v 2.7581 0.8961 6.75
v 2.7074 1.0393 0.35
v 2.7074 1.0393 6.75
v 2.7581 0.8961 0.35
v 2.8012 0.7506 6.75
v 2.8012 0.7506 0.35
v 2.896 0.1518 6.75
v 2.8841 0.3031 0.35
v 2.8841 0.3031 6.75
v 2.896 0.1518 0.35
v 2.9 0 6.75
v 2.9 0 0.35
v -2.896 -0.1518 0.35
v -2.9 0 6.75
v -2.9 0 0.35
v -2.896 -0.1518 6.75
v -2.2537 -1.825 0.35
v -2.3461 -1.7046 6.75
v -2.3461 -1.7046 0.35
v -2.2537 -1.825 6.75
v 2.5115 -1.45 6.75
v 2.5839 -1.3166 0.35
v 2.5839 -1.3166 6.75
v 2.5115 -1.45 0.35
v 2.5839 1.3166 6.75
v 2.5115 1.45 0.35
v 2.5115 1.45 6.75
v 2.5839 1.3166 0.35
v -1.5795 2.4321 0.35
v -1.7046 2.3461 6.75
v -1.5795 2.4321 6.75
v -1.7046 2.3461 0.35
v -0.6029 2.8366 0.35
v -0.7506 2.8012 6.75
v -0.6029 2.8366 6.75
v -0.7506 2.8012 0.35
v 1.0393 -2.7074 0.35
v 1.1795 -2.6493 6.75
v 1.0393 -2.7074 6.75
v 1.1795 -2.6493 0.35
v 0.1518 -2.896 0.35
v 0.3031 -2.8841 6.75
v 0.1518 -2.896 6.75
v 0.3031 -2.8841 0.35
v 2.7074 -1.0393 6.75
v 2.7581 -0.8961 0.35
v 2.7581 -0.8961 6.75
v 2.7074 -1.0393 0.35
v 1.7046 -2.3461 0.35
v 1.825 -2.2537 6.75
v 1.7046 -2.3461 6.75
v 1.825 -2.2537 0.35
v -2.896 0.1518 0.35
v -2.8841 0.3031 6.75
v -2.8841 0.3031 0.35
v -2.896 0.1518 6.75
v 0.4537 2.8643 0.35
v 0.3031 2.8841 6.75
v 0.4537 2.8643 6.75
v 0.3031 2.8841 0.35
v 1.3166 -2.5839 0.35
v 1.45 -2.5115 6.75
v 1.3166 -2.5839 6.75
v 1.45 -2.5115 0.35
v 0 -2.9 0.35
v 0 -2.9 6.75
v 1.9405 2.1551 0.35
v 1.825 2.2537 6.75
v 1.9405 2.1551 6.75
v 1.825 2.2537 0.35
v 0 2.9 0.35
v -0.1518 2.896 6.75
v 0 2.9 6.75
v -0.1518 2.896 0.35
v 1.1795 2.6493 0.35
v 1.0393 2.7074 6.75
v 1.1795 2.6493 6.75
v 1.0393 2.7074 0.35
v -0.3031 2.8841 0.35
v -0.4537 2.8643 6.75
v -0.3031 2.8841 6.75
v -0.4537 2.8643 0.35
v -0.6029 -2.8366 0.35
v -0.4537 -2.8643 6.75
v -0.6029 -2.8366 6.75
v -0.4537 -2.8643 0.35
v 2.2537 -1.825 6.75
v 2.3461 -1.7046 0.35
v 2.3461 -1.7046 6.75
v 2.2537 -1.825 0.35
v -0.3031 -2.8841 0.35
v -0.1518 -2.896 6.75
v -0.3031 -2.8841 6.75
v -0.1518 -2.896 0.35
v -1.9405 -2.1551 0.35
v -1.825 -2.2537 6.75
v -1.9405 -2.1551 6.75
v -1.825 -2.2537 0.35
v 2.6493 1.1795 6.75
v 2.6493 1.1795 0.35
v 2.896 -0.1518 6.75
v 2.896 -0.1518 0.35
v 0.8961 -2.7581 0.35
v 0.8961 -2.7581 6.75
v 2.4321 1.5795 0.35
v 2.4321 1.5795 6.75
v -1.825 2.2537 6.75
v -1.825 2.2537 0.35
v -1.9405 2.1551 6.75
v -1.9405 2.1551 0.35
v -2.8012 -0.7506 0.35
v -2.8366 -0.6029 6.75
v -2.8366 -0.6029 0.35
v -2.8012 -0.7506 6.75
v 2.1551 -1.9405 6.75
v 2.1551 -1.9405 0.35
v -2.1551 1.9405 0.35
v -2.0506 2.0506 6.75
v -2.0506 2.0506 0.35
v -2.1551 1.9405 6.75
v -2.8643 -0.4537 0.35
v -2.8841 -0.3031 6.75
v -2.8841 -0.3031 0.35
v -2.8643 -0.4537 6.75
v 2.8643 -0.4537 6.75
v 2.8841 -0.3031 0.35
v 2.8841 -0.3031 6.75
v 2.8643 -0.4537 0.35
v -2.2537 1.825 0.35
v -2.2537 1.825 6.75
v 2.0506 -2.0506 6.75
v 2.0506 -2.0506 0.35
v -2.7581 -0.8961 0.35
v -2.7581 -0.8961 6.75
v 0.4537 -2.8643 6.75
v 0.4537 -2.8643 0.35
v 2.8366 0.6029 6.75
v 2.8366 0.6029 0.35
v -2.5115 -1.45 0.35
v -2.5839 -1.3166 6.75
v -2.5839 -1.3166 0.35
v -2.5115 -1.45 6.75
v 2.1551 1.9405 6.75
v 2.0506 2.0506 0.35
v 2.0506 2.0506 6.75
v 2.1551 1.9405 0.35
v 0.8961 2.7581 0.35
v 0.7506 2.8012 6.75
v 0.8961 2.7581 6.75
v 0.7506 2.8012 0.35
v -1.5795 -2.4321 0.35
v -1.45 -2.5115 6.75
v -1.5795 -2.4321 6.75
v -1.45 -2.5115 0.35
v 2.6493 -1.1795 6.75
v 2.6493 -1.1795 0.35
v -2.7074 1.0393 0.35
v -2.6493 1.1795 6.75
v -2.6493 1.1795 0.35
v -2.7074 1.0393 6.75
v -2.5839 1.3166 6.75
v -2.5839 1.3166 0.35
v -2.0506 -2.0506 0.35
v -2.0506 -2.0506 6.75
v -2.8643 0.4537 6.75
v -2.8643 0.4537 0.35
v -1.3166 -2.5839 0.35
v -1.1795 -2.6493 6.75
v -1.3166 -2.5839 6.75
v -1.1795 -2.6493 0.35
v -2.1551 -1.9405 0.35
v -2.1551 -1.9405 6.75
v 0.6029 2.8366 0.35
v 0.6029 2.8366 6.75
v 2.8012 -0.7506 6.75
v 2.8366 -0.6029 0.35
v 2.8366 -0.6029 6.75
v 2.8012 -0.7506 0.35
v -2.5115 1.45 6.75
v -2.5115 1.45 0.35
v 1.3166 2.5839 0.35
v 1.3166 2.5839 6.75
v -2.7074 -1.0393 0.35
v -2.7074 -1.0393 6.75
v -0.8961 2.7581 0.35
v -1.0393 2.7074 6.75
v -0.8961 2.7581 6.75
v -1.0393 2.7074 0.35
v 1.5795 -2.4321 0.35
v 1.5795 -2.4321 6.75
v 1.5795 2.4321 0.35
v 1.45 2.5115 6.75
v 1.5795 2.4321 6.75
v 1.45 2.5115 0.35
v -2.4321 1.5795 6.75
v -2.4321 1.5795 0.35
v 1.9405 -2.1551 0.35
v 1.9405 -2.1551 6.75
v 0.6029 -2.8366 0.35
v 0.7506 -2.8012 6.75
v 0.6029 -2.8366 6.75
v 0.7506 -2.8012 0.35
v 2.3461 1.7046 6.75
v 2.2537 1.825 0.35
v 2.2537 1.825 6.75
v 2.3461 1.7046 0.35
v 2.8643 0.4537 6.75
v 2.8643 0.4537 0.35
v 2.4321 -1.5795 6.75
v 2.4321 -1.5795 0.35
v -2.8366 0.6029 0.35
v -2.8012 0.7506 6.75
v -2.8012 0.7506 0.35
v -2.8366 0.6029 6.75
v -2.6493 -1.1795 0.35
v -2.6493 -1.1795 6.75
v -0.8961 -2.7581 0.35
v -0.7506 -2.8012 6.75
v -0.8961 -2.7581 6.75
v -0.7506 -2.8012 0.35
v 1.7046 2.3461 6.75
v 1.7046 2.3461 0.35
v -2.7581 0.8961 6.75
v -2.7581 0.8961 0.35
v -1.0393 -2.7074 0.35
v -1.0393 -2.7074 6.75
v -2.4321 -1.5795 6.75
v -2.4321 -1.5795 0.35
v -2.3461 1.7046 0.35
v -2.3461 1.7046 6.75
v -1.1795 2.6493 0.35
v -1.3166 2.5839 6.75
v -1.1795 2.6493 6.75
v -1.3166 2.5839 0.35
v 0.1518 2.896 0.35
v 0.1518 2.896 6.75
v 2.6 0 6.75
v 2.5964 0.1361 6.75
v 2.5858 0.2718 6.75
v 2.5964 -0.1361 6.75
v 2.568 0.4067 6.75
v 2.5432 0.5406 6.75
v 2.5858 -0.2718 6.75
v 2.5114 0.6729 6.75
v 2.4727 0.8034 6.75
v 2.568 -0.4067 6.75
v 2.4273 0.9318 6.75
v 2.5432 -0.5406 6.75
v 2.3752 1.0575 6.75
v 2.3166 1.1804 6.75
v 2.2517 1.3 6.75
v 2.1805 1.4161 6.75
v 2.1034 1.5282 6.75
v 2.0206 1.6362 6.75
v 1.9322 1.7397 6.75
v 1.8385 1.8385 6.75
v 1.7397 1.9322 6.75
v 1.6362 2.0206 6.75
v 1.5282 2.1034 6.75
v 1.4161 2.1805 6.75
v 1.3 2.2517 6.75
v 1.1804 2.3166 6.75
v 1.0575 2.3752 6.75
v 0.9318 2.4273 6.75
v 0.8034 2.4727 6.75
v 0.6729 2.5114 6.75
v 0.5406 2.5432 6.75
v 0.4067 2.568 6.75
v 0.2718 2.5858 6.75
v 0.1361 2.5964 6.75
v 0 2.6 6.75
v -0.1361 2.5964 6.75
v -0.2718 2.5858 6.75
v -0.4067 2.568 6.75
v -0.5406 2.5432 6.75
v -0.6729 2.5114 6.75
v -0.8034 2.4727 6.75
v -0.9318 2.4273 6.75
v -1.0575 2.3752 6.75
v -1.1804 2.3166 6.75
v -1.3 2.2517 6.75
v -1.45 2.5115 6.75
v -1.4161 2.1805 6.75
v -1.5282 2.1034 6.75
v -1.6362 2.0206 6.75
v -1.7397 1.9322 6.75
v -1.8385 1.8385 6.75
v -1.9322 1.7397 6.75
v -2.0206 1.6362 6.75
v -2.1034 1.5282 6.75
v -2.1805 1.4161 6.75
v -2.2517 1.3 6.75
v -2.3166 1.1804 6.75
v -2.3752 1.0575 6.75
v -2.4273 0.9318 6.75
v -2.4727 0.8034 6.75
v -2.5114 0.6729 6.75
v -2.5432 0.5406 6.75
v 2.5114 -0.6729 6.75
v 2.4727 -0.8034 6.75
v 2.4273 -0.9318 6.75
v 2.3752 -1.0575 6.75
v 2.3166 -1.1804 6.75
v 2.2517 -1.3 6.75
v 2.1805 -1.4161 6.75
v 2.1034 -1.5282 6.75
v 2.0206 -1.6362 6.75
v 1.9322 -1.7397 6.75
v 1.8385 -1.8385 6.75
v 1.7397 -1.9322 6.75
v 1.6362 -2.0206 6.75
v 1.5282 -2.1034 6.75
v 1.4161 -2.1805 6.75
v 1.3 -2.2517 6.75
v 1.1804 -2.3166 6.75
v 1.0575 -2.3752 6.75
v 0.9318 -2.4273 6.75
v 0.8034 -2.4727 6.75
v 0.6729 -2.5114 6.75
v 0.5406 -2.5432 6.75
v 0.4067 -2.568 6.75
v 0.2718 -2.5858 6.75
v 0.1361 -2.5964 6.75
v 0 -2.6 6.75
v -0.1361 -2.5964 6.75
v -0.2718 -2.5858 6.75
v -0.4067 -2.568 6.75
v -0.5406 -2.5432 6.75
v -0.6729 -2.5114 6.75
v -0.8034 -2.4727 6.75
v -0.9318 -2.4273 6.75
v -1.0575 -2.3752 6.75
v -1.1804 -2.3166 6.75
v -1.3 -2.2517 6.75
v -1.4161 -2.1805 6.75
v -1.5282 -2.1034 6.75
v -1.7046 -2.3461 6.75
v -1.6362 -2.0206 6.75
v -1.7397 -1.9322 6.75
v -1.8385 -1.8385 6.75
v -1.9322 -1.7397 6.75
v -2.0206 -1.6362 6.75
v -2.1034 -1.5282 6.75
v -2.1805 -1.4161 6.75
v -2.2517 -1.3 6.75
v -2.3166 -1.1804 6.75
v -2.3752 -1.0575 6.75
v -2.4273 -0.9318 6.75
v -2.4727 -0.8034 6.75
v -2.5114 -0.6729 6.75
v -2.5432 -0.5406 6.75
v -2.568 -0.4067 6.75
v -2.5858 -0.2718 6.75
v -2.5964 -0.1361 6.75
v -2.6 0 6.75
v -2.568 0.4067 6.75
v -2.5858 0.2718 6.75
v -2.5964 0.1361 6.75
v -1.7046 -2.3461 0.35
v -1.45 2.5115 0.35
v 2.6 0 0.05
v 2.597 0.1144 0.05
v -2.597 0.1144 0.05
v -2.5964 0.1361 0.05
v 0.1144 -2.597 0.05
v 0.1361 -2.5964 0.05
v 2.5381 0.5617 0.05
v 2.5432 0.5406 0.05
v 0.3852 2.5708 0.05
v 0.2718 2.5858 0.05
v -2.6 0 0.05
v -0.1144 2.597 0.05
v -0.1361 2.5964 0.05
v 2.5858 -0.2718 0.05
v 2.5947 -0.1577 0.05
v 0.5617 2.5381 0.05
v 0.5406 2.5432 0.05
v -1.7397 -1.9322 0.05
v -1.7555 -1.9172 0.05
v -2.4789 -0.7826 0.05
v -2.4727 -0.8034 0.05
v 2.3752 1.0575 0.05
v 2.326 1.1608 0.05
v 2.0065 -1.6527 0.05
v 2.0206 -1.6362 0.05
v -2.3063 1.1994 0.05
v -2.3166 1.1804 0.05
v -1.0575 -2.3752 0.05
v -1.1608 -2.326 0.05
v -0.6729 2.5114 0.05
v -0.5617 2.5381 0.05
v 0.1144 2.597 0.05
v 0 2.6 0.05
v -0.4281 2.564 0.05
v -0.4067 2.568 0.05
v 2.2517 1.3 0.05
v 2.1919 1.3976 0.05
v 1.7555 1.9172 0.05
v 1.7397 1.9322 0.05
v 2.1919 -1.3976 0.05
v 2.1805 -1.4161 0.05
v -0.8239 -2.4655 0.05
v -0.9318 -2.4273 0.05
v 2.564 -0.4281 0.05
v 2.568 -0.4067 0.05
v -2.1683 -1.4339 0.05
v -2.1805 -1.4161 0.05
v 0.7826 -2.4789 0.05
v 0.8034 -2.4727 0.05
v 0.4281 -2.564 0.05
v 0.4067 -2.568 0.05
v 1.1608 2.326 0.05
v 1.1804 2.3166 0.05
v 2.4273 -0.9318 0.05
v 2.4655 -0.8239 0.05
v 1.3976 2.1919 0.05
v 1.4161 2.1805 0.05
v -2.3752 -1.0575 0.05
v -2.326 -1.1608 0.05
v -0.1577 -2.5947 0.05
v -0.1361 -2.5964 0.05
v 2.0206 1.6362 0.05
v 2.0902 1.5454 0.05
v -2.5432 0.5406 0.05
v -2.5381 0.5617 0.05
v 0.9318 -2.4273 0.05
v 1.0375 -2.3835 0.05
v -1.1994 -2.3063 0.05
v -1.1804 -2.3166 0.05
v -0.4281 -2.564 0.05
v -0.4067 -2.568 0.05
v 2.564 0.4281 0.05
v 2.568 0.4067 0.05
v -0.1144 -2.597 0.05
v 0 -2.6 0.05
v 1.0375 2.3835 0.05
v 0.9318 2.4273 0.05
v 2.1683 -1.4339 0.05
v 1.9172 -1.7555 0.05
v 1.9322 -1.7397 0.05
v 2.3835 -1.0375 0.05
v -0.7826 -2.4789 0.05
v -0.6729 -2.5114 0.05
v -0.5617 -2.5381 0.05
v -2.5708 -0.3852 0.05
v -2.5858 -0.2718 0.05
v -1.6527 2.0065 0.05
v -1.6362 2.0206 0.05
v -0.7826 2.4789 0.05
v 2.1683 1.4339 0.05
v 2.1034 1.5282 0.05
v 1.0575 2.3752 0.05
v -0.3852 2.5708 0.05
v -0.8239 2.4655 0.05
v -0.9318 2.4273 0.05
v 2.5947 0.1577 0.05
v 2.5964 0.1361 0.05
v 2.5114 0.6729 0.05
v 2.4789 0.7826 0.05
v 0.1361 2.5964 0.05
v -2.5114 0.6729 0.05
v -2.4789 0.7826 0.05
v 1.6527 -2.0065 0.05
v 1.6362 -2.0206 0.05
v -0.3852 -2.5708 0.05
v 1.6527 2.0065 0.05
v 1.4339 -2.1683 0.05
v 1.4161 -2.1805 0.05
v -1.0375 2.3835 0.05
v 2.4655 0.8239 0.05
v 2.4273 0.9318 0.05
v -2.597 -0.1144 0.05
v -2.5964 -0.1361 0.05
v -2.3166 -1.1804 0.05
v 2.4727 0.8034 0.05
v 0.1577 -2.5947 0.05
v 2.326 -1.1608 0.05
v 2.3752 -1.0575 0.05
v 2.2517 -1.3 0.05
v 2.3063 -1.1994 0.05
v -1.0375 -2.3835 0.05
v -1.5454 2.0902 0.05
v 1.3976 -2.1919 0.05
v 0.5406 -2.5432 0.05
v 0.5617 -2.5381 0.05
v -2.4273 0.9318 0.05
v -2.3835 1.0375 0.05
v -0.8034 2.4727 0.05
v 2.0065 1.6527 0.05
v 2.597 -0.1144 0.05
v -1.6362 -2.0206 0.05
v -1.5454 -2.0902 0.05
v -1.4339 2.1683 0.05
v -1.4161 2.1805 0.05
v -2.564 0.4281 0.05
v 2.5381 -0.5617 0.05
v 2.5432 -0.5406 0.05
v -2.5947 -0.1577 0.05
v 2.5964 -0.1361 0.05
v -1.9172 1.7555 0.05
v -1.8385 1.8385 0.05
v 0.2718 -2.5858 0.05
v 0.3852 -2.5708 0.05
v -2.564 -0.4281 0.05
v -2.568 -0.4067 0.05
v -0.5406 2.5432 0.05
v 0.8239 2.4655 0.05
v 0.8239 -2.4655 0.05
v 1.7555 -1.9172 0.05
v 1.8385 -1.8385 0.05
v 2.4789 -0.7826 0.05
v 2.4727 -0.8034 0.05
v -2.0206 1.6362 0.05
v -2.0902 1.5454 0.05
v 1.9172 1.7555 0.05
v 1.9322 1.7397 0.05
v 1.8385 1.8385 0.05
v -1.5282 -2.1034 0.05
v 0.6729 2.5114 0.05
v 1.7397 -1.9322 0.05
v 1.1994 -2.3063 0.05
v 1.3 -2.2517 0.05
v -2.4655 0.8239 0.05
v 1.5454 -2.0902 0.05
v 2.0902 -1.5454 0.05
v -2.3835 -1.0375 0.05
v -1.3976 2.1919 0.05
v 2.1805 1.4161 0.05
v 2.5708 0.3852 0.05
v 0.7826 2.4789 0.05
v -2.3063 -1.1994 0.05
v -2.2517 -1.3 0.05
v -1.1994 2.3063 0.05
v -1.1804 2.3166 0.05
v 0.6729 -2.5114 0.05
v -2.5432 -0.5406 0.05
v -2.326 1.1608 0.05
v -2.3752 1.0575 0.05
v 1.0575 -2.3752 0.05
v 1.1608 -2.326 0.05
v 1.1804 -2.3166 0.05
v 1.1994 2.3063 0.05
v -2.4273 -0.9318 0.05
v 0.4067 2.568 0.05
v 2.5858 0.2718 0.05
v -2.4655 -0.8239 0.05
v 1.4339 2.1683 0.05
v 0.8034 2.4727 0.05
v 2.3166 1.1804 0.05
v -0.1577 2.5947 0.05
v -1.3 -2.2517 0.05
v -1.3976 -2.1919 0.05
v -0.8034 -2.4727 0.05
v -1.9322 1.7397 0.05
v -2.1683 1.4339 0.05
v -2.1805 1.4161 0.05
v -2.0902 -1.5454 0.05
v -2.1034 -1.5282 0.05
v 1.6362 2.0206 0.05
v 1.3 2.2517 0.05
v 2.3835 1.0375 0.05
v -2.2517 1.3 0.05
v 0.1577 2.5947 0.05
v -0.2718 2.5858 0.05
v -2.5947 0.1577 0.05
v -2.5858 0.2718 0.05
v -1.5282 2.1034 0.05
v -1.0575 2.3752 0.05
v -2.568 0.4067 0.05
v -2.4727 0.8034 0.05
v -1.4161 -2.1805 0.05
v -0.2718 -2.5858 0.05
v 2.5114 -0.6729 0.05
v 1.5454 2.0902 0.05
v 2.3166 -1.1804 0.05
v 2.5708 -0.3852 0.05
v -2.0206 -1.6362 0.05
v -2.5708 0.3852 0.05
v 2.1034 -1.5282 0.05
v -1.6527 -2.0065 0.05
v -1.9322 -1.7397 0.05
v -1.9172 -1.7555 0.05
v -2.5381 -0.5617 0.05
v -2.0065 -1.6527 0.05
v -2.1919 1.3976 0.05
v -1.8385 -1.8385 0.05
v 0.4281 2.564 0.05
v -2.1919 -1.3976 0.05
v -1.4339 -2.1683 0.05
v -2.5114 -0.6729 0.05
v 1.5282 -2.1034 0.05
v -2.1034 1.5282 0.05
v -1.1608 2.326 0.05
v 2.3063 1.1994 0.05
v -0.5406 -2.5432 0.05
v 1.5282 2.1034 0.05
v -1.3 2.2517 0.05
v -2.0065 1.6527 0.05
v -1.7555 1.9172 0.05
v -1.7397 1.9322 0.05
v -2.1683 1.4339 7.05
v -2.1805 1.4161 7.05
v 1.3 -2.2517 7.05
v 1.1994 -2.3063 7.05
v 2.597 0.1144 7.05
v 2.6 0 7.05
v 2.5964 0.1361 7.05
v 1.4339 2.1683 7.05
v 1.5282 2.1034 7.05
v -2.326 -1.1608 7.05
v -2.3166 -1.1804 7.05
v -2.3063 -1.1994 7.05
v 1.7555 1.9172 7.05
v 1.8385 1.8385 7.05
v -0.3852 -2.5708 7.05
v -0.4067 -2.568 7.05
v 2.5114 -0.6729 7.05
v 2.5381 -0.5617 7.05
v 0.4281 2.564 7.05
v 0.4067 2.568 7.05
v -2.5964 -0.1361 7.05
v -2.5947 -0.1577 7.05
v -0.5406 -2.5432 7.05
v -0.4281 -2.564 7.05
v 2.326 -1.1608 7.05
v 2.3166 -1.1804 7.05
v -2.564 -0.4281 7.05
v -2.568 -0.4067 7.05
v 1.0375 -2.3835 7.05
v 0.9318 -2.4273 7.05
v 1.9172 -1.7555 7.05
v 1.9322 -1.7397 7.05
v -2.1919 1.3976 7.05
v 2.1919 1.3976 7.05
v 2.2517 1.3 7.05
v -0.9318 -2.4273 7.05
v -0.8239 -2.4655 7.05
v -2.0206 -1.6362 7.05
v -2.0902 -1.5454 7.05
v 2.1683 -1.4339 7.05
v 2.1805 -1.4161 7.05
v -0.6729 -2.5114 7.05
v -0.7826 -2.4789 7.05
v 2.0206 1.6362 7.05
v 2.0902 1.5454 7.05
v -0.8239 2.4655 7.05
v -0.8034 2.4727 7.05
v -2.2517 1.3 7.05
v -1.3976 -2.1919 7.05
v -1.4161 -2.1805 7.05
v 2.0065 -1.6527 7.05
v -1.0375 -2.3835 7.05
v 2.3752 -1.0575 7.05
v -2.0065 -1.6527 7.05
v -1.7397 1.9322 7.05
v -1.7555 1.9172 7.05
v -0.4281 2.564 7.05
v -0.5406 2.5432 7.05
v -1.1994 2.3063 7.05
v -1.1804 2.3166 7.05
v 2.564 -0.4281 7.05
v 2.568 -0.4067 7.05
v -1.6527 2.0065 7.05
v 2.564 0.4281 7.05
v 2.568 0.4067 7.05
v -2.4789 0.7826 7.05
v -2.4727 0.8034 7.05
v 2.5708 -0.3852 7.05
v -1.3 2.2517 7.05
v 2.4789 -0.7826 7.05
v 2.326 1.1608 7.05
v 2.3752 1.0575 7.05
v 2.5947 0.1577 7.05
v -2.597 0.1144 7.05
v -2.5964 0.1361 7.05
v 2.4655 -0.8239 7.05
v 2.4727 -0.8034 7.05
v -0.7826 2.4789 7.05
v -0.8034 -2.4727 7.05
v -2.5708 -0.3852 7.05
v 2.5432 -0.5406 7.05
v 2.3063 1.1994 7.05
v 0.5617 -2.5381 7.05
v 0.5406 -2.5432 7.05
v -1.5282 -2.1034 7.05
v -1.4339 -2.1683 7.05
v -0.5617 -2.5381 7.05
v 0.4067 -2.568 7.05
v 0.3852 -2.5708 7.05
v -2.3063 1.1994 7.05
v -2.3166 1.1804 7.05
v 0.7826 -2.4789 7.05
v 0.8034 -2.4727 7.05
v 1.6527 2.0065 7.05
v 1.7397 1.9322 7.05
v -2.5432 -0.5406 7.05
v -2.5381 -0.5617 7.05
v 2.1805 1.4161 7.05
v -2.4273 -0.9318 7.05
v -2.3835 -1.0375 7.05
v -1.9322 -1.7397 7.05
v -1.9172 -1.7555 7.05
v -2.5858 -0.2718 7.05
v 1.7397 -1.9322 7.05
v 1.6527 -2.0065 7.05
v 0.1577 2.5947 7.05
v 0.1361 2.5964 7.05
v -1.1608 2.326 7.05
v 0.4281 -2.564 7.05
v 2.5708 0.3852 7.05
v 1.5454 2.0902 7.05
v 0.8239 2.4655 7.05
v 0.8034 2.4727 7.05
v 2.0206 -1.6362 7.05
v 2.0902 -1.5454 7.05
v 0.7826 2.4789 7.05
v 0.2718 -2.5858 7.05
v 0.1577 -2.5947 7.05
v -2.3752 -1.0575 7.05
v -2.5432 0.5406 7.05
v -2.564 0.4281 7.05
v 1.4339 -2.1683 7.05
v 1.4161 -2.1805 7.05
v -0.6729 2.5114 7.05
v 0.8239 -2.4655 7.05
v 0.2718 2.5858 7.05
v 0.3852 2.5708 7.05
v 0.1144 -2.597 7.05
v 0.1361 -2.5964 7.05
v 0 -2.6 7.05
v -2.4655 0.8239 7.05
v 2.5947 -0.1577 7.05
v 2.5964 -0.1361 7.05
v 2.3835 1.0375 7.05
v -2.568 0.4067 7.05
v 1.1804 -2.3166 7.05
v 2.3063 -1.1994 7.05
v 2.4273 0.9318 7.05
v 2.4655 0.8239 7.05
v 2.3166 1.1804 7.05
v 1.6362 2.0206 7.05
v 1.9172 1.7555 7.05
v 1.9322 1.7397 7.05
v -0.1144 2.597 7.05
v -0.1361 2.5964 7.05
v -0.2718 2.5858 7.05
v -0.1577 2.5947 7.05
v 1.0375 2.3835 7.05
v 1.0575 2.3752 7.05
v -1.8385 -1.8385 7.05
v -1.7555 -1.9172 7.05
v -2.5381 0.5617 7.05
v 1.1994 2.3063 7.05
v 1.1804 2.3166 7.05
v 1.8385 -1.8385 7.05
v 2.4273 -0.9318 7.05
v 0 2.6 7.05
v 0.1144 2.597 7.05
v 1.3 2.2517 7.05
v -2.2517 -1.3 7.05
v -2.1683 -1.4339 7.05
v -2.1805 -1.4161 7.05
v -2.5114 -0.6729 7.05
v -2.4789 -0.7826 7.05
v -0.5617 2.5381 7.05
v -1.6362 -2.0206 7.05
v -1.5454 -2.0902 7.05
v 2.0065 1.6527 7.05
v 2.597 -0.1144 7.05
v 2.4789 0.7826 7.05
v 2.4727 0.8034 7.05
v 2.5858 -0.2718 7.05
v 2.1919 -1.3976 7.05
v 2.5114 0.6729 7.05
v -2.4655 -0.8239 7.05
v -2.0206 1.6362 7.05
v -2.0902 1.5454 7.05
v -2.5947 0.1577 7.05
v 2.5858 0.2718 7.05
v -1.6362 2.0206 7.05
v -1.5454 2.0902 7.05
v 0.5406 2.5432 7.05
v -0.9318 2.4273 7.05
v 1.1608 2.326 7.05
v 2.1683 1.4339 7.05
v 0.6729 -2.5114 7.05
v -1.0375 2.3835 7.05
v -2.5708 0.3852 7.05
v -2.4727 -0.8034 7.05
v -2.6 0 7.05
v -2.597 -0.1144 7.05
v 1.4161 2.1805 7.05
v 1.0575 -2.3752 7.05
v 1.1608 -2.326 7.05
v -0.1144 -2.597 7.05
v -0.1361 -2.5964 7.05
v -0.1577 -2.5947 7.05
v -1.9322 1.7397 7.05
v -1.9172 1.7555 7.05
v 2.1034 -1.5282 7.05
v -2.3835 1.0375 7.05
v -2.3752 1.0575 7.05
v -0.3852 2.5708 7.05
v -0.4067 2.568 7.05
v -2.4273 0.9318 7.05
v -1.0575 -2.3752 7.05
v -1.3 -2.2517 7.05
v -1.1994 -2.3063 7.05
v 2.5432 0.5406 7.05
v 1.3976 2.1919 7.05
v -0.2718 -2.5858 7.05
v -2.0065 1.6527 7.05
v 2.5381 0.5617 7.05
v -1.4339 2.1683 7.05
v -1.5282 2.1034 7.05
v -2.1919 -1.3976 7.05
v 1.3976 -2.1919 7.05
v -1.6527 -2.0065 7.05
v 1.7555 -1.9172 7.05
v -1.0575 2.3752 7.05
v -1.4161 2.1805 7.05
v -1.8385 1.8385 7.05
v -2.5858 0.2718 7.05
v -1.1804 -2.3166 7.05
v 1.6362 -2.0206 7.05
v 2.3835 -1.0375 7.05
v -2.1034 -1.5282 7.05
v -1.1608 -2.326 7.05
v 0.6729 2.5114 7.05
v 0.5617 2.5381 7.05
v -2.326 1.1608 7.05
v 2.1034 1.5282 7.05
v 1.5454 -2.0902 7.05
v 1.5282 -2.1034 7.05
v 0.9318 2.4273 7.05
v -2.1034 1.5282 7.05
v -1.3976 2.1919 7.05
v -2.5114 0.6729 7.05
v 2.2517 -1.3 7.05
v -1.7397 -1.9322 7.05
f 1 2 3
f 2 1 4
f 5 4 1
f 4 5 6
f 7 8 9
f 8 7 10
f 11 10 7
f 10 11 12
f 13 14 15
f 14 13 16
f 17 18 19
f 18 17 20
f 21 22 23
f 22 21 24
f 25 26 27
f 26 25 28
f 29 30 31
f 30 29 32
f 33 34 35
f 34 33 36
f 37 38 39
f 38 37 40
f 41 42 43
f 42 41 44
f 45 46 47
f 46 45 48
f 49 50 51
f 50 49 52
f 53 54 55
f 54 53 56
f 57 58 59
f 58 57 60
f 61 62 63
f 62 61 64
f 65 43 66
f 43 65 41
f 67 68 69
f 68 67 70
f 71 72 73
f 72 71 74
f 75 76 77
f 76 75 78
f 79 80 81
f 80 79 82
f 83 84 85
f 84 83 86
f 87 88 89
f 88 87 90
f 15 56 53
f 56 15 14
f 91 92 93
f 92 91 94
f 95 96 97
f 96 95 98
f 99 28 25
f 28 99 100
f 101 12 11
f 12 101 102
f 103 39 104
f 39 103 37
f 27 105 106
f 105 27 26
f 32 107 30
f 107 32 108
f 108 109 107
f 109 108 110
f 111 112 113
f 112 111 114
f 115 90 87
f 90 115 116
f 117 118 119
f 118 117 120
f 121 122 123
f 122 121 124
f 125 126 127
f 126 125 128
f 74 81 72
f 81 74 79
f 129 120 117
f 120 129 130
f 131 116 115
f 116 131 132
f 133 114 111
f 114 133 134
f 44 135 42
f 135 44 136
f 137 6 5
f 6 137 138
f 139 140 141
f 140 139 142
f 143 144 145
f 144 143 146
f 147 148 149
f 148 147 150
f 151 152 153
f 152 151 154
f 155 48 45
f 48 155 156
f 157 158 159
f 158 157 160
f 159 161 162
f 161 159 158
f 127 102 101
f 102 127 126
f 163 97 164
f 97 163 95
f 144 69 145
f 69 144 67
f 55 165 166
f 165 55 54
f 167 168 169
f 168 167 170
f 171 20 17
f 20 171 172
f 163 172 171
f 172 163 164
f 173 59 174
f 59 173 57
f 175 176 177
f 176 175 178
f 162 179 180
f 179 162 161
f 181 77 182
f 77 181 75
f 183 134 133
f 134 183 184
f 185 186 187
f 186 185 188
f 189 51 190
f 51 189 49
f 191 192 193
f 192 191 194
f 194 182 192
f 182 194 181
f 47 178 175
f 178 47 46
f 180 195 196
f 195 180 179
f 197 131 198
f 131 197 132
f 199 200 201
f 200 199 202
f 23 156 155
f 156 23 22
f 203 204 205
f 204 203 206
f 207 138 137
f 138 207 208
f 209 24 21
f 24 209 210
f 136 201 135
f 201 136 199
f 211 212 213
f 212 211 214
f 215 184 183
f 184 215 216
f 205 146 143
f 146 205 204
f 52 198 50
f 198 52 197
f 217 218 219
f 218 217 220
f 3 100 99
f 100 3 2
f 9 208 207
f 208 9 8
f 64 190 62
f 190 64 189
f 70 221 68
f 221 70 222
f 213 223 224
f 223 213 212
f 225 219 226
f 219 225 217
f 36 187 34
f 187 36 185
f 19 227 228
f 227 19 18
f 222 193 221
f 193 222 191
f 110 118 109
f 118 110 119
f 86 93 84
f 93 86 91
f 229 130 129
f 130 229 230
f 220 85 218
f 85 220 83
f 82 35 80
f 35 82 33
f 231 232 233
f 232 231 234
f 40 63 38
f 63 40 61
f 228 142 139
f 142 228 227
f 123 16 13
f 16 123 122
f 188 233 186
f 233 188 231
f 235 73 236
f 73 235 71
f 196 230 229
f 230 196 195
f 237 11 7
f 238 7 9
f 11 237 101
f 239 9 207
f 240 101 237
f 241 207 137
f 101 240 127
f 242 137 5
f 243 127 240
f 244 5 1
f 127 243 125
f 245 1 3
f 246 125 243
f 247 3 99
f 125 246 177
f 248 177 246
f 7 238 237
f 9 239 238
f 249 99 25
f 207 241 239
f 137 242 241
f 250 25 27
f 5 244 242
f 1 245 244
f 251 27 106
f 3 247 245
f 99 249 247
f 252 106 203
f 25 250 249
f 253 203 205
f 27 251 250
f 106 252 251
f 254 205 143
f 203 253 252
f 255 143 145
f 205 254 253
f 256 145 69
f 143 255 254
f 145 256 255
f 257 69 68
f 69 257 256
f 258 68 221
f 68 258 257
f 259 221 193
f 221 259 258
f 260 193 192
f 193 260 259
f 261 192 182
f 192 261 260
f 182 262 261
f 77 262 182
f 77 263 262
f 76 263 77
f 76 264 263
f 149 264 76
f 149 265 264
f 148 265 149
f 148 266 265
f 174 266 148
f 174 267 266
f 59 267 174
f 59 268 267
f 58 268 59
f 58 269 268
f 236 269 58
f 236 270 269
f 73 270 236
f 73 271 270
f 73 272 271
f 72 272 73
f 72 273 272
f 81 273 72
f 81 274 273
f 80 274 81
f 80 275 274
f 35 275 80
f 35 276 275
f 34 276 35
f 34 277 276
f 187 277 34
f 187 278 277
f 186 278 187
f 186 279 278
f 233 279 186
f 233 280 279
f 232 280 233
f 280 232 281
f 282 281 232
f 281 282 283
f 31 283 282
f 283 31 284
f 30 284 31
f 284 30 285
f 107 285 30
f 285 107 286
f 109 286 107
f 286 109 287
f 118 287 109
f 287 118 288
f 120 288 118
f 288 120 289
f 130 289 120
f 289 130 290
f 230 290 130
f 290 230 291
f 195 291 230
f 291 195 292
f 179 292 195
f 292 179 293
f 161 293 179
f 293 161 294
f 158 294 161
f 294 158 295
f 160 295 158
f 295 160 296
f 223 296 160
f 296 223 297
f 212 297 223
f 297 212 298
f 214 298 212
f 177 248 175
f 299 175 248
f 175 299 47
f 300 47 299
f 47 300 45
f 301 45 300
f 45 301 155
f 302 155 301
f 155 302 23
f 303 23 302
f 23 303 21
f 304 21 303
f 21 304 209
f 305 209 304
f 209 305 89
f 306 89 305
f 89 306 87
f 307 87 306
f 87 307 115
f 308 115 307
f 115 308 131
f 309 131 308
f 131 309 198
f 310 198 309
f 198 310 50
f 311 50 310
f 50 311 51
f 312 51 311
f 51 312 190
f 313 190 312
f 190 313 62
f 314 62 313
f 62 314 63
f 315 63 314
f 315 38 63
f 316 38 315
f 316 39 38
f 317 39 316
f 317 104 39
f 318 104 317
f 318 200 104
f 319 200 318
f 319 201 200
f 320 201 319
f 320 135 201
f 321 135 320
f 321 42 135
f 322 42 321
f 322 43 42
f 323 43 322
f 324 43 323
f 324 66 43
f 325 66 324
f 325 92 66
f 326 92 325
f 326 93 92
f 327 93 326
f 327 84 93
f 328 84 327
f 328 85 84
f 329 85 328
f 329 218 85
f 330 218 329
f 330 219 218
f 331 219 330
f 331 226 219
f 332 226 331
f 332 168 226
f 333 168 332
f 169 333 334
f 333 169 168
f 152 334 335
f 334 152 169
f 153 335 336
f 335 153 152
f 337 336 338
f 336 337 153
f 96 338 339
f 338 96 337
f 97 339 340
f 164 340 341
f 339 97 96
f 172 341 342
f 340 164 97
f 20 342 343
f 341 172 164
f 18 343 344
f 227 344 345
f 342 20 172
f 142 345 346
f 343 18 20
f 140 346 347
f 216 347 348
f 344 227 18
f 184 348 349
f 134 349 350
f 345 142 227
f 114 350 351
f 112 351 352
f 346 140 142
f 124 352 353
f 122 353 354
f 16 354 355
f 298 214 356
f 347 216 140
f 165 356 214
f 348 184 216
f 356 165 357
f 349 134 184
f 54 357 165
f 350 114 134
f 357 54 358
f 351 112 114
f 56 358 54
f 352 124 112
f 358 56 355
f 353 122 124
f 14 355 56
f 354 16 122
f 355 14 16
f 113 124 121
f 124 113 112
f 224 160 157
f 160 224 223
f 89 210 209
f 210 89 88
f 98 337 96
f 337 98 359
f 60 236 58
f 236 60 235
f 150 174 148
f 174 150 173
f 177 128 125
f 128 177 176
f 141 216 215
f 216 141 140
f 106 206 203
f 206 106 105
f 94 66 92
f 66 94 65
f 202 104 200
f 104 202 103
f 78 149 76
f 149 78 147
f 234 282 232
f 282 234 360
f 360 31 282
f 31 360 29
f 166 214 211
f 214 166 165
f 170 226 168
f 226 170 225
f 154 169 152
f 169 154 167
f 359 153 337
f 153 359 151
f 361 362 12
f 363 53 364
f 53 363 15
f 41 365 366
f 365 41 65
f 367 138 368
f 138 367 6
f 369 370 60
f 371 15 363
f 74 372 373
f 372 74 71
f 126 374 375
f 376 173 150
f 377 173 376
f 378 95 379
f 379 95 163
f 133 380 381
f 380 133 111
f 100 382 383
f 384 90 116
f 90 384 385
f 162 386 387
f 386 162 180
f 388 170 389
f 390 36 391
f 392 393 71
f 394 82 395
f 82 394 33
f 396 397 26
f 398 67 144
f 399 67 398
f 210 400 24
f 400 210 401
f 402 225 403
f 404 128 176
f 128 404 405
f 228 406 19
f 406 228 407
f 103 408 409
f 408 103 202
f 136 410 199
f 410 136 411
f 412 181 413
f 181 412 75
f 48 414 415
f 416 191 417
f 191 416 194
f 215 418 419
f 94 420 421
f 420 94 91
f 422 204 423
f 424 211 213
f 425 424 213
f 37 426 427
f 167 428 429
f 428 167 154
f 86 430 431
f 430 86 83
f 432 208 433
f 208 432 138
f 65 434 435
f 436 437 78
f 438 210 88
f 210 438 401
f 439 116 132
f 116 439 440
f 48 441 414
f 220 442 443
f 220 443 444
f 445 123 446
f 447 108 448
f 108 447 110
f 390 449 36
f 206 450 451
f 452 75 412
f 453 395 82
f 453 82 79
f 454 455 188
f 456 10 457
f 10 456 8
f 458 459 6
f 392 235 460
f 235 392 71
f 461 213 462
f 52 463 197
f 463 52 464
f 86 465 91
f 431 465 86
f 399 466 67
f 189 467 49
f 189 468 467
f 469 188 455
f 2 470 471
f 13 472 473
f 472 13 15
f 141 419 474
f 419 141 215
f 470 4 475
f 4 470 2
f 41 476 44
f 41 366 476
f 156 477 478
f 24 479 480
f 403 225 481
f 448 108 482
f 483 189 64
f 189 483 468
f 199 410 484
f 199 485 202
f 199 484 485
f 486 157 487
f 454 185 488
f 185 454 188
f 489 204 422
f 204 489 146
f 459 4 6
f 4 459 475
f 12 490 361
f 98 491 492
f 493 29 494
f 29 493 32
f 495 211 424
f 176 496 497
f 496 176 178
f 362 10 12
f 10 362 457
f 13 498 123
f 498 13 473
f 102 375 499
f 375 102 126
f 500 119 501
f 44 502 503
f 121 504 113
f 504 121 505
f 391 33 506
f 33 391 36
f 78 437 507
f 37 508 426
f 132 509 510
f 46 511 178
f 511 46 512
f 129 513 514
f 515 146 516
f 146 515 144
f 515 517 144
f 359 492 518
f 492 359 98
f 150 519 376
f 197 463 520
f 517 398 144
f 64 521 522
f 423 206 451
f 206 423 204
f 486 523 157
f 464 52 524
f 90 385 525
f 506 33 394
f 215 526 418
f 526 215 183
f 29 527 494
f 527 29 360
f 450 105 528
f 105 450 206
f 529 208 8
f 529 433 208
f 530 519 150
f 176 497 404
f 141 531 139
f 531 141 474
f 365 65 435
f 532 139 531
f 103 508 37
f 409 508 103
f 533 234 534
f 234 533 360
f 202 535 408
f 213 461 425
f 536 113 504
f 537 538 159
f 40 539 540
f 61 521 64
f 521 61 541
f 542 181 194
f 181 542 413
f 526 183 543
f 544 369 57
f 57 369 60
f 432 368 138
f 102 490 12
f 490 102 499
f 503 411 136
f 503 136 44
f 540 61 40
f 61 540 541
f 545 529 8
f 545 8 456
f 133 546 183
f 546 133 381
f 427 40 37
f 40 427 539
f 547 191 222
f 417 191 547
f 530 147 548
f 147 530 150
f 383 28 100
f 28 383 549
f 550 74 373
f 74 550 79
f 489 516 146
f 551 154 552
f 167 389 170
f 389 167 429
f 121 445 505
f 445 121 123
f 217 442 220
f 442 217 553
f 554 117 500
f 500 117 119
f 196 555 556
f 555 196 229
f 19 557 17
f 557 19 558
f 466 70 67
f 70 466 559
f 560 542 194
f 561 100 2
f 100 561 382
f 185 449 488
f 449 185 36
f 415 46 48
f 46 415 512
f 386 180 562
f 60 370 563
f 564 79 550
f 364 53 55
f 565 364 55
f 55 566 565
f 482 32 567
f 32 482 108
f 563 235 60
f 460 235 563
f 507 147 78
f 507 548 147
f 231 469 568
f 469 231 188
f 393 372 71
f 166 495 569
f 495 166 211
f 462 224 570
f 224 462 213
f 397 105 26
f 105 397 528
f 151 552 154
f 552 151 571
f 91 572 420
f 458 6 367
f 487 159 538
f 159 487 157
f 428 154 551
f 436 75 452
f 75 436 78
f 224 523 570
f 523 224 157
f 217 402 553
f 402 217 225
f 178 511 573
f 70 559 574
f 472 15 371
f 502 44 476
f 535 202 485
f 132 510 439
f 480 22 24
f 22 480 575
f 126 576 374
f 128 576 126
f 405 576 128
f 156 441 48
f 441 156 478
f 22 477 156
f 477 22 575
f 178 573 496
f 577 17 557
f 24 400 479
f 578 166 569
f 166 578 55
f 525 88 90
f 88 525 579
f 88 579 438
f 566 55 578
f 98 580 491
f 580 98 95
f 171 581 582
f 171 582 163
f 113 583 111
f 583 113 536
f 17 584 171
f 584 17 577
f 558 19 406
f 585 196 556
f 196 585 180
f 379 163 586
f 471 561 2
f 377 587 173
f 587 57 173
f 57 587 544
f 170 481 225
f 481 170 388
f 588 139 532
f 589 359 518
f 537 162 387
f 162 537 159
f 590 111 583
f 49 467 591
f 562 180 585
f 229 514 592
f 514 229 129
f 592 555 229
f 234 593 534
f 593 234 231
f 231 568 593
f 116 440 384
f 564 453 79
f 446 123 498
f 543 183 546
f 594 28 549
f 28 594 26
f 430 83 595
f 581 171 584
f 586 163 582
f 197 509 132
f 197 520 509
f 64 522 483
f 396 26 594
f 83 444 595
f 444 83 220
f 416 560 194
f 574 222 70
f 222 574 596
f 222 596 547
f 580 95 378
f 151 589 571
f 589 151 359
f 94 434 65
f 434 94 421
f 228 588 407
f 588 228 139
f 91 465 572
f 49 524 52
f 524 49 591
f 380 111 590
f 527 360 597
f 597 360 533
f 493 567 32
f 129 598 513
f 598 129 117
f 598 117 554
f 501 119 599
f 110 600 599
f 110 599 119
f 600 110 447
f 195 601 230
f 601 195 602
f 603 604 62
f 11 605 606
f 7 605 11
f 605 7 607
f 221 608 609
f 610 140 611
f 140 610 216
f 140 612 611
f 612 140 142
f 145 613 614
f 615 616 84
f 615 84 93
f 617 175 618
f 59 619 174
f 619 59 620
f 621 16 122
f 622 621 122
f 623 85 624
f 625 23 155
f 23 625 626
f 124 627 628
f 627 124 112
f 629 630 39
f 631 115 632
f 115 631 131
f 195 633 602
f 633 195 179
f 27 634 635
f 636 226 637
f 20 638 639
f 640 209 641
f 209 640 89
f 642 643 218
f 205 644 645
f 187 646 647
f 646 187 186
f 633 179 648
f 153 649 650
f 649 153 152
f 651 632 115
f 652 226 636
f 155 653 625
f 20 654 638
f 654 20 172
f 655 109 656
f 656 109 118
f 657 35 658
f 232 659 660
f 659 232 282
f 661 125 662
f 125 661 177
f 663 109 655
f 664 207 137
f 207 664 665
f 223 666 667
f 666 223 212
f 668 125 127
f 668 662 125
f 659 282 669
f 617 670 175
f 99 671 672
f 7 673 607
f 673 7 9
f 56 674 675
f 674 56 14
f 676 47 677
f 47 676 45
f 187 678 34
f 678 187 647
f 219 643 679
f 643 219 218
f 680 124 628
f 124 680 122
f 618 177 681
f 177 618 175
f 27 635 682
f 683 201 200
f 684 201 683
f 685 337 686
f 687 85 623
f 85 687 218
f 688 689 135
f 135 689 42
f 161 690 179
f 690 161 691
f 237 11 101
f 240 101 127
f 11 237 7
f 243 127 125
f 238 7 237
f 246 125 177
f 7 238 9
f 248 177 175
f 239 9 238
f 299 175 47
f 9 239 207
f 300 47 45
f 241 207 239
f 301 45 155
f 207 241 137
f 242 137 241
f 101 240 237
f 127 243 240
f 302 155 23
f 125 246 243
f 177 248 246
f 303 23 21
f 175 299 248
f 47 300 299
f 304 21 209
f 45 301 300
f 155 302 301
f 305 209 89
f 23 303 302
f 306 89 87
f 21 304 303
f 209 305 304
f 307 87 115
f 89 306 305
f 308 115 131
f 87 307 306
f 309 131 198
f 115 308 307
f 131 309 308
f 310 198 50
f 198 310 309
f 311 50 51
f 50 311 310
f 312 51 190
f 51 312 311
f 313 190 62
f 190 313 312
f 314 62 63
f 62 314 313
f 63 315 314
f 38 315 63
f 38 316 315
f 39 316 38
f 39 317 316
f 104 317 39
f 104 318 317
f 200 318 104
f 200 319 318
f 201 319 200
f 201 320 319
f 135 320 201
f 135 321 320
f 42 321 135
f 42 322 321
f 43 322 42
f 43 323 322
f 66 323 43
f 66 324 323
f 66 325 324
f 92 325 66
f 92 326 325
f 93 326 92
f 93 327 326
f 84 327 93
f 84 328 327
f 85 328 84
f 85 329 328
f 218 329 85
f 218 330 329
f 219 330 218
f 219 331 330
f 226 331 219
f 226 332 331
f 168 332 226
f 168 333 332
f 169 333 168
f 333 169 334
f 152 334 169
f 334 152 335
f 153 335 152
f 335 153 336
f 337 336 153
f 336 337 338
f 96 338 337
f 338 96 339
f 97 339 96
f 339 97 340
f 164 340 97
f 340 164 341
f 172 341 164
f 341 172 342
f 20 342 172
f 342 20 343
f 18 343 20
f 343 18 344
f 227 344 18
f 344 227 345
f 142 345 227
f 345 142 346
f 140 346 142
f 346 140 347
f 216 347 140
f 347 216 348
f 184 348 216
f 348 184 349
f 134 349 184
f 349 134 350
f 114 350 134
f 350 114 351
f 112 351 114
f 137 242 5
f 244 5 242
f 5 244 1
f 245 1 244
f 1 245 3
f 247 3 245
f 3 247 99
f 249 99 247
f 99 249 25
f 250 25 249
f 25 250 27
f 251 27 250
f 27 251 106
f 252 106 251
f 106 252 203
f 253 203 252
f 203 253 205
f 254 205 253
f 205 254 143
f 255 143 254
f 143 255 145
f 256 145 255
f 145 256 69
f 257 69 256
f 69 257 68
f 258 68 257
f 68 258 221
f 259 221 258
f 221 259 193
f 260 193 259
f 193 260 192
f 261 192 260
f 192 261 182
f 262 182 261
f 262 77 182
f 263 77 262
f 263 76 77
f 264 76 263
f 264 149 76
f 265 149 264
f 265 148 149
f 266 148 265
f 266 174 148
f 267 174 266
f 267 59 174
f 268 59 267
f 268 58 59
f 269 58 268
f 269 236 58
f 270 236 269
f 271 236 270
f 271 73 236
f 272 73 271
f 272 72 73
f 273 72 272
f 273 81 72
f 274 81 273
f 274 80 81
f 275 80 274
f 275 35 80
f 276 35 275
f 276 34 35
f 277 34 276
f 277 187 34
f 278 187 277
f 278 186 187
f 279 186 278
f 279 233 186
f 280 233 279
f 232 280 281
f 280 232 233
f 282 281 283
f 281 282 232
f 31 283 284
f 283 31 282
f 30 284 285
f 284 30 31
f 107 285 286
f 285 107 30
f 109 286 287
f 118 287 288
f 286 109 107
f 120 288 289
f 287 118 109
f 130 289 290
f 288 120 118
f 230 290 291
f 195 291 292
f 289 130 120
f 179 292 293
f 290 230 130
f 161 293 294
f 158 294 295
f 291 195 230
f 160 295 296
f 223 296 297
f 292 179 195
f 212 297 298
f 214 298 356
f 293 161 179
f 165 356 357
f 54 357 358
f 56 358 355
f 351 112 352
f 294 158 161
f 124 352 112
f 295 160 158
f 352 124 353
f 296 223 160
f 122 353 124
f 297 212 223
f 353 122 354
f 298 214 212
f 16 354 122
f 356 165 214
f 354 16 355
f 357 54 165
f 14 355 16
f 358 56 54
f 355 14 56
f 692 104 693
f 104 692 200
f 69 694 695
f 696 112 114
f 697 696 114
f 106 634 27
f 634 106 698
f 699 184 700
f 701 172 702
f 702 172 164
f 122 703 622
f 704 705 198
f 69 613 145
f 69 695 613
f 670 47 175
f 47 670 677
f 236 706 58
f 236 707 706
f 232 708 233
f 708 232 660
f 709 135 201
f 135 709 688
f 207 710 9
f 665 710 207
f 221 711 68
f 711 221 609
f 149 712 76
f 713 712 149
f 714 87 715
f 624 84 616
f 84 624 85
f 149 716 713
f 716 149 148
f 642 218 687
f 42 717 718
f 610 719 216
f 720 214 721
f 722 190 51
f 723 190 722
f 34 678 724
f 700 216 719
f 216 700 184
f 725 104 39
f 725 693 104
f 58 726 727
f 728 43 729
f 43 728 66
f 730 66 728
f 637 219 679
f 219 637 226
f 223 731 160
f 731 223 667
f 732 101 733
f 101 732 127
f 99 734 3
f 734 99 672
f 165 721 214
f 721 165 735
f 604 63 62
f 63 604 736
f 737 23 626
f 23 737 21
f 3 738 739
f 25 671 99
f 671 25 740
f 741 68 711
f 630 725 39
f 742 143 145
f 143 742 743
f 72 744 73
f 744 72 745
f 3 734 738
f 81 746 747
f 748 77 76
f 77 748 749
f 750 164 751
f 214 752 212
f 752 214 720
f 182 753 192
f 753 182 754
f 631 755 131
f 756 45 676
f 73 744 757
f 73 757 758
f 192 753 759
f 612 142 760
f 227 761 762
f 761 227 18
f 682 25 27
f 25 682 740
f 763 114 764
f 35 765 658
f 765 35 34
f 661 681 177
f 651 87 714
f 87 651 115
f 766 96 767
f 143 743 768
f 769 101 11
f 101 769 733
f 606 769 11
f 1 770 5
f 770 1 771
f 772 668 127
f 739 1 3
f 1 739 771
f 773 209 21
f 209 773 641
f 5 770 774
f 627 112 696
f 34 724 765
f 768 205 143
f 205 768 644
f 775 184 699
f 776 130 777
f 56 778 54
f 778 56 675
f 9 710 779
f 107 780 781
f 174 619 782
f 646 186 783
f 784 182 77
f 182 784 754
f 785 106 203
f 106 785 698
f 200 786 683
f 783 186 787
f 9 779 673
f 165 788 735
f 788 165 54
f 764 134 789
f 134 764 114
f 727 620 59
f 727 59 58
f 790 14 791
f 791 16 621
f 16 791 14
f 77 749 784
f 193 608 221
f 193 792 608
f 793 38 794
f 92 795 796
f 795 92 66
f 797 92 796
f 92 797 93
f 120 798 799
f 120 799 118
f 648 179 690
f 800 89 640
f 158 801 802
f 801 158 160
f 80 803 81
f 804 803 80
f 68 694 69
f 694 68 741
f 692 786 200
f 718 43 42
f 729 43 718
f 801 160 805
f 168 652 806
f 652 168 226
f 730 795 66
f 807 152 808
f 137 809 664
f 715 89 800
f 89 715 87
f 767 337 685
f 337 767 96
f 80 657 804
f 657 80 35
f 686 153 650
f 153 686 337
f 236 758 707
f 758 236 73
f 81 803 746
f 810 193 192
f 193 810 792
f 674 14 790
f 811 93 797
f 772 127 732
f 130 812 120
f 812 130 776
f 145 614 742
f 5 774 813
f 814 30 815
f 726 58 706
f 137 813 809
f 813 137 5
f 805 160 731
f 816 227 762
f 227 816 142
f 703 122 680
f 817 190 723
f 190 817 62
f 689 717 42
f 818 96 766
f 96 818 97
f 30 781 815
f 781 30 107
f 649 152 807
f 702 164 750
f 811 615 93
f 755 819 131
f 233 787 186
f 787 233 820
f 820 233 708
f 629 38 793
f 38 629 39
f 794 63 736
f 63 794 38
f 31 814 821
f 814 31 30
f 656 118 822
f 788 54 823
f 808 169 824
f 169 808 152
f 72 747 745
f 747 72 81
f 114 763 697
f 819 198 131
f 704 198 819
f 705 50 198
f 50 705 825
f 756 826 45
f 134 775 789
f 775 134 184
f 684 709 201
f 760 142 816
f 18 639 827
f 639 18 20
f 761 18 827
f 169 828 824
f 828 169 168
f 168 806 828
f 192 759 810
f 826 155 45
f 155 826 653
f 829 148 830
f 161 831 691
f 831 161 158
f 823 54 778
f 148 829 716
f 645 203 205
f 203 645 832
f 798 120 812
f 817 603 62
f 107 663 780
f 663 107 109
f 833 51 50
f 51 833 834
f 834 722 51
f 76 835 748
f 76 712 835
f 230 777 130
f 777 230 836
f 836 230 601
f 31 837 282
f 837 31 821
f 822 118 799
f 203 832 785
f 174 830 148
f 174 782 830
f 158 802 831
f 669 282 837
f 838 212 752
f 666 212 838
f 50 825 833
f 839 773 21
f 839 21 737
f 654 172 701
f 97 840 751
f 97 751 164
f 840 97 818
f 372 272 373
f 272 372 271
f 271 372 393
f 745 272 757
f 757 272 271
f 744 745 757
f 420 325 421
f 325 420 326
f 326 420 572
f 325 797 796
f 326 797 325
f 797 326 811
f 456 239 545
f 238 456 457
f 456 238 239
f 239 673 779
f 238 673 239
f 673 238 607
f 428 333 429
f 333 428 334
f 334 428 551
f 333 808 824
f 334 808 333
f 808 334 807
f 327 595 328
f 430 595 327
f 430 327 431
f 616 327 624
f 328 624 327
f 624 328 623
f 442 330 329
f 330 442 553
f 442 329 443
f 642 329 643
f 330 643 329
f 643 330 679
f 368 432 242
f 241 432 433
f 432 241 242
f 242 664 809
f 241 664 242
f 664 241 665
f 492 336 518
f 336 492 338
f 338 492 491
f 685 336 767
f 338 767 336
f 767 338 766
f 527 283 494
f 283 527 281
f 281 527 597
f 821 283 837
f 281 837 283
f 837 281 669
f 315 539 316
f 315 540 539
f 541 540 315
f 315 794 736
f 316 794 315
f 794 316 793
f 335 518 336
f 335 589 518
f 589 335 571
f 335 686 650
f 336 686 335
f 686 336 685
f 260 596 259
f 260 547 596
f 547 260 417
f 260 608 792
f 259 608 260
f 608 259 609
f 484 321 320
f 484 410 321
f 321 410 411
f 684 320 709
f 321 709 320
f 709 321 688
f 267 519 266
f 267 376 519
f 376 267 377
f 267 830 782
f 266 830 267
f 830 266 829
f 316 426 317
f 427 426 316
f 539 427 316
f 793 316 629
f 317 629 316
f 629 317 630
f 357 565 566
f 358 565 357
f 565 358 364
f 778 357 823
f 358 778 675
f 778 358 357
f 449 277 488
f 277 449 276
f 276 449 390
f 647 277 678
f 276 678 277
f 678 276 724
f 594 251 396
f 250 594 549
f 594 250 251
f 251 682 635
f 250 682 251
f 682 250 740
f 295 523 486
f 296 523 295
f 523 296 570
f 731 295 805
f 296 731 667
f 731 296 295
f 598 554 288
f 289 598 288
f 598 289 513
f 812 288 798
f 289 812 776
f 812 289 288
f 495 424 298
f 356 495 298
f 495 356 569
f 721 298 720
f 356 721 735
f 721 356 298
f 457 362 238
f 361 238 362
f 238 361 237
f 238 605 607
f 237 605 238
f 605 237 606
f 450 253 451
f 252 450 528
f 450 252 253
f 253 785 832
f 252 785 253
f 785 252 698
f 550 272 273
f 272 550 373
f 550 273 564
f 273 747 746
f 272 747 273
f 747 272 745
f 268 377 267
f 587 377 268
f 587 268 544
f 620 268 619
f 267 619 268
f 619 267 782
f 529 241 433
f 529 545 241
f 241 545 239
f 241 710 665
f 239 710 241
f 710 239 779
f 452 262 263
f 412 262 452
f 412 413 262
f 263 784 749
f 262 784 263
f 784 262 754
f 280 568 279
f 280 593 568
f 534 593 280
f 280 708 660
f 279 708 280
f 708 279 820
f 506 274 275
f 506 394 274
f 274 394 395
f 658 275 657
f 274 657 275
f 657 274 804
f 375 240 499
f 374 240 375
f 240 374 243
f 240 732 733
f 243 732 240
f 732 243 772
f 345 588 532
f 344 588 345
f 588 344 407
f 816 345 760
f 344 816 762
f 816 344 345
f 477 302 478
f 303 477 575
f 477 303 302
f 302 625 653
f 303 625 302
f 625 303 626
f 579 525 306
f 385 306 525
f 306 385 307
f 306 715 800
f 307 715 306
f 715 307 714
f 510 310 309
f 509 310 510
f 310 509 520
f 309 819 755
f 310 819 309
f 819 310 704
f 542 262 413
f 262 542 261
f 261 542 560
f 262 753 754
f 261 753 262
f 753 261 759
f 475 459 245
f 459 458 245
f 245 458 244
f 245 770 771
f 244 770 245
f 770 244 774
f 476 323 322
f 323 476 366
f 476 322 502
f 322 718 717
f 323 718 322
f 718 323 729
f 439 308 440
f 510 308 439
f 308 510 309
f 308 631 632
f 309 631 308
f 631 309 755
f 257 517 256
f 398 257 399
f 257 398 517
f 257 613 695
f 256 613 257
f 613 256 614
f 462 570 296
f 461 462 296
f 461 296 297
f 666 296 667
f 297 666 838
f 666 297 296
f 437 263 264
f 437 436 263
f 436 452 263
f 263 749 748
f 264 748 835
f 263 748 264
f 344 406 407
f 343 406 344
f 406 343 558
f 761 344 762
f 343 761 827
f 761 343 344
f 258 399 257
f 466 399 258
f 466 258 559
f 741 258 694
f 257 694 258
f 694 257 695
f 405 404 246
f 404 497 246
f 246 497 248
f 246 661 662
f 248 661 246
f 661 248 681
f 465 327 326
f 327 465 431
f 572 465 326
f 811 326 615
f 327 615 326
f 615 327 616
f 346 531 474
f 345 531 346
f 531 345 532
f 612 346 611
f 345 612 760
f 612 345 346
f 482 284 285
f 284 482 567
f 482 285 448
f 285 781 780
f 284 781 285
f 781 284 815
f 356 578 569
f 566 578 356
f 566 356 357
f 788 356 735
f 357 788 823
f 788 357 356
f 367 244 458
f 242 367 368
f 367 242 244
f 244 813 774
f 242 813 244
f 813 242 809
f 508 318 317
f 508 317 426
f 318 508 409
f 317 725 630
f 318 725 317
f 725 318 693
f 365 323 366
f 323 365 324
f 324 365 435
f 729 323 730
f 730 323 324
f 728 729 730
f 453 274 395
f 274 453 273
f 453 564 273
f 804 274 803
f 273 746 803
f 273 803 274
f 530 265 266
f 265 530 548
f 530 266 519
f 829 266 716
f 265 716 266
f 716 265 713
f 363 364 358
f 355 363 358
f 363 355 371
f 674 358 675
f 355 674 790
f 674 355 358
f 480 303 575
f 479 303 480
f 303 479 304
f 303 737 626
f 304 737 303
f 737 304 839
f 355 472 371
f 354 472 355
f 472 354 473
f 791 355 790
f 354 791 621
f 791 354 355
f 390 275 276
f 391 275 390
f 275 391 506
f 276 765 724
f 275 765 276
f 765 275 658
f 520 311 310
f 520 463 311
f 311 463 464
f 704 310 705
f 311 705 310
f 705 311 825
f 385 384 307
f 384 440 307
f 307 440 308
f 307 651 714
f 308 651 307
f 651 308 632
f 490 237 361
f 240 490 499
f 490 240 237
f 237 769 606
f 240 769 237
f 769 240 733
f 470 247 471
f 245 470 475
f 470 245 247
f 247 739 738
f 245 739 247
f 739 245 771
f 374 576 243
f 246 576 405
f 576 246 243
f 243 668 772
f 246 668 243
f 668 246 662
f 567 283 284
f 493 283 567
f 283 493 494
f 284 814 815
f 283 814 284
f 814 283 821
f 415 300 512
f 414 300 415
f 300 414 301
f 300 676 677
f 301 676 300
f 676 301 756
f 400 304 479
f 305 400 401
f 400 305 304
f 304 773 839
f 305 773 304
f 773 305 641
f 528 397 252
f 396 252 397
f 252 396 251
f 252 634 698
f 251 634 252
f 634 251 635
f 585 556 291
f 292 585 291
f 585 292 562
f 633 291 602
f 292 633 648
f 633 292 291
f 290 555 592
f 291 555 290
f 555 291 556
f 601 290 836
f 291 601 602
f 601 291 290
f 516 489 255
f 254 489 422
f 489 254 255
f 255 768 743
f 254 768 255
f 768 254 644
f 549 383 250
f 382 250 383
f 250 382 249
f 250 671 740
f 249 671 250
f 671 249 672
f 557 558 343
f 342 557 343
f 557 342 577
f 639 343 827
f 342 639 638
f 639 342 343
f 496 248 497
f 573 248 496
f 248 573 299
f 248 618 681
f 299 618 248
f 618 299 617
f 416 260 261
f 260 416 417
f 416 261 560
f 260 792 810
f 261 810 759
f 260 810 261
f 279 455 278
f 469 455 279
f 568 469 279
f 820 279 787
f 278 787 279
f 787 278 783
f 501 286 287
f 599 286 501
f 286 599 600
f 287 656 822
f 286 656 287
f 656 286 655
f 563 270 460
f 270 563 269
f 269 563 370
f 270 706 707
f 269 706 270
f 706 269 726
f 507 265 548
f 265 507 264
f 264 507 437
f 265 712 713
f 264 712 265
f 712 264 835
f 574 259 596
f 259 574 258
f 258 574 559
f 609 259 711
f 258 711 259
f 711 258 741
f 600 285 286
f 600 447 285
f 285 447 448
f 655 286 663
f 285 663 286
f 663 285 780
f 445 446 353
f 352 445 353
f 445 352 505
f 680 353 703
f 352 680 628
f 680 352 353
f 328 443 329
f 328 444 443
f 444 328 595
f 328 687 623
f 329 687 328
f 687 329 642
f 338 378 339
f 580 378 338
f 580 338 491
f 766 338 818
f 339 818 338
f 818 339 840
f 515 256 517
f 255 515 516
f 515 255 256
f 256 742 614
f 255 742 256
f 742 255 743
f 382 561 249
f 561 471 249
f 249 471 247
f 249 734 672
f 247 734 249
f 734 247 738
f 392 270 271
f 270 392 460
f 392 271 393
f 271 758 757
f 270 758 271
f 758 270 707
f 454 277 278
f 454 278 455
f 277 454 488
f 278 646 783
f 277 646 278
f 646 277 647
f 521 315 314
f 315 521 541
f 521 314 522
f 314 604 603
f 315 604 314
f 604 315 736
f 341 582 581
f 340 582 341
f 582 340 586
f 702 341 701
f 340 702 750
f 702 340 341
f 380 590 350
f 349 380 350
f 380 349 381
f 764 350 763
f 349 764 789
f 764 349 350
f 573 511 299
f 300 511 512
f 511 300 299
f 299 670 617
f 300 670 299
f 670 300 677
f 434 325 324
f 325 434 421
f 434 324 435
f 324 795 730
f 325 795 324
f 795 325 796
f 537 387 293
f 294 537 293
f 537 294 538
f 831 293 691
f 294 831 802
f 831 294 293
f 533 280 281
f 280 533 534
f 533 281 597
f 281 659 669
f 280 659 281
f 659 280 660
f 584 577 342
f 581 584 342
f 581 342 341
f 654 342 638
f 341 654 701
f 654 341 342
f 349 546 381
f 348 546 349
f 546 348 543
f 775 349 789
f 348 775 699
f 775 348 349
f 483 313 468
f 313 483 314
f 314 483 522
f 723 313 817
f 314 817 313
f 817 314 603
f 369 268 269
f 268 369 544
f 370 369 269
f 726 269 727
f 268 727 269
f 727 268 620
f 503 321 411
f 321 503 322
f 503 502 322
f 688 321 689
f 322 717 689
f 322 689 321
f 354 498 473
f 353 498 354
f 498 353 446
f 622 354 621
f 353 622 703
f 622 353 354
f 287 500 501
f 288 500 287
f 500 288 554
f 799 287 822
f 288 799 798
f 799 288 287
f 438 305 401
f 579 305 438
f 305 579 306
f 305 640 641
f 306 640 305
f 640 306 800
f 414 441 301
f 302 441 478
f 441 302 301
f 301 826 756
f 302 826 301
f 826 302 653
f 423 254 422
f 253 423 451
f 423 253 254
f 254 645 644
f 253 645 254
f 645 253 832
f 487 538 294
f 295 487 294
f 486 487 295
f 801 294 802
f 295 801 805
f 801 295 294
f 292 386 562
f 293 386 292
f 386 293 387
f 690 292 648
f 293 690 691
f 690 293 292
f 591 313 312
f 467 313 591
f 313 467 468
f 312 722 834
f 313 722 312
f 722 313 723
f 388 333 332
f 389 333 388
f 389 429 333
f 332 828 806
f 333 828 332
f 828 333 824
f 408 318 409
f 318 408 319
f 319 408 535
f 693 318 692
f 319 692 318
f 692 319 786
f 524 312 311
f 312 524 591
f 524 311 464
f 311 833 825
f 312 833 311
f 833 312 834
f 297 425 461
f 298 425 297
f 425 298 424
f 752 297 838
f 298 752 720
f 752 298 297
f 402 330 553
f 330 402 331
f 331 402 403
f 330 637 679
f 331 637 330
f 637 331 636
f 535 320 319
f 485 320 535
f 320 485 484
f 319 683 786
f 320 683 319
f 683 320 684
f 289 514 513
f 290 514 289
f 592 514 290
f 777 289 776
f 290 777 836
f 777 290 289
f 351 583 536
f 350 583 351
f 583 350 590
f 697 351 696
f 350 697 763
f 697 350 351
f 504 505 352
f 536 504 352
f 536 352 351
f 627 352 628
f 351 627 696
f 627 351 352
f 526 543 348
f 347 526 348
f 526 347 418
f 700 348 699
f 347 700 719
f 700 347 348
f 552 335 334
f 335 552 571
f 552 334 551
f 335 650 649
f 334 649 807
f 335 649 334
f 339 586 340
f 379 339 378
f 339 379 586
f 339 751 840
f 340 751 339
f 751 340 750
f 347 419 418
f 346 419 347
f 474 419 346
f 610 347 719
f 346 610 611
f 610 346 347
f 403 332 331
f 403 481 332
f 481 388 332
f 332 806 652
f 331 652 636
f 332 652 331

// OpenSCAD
$fn = 120;

// Heat-set insert (simplified, renderable model)
// Outer: 5.8mm OD, 7.1mm length
// Inner: sized for M5 screw clearance (approx), not a true thread model

od = 5.8;
len = 7.1;

// Typical M5 clearance ~5.2mm; adjust if you want tighter/looser
id = 5.2;

// Small lead-in chamfers
ch = 0.35;

module heat_set_insert(od=5.8, id=5.2, len=7.1, ch=0.35) {
    difference() {
        // Outer body with chamfers
        union() {
            // Main cylinder
            translate([0,0,ch])
                cylinder(h=len-2*ch, d=od);

            // Bottom chamfer
            cylinder(h=ch, d1=od-2*ch, d2=od);

            // Top chamfer
            translate([0,0,len-ch])
                cylinder(h=ch, d1=od, d2=od-2*ch);
        }

        // Through-hole
        translate([0,0,-0.2])
            cylinder(h=len+0.4, d=id);
    }
}

heat_set_insert(od=od, id=id, len=len, ch=ch);
